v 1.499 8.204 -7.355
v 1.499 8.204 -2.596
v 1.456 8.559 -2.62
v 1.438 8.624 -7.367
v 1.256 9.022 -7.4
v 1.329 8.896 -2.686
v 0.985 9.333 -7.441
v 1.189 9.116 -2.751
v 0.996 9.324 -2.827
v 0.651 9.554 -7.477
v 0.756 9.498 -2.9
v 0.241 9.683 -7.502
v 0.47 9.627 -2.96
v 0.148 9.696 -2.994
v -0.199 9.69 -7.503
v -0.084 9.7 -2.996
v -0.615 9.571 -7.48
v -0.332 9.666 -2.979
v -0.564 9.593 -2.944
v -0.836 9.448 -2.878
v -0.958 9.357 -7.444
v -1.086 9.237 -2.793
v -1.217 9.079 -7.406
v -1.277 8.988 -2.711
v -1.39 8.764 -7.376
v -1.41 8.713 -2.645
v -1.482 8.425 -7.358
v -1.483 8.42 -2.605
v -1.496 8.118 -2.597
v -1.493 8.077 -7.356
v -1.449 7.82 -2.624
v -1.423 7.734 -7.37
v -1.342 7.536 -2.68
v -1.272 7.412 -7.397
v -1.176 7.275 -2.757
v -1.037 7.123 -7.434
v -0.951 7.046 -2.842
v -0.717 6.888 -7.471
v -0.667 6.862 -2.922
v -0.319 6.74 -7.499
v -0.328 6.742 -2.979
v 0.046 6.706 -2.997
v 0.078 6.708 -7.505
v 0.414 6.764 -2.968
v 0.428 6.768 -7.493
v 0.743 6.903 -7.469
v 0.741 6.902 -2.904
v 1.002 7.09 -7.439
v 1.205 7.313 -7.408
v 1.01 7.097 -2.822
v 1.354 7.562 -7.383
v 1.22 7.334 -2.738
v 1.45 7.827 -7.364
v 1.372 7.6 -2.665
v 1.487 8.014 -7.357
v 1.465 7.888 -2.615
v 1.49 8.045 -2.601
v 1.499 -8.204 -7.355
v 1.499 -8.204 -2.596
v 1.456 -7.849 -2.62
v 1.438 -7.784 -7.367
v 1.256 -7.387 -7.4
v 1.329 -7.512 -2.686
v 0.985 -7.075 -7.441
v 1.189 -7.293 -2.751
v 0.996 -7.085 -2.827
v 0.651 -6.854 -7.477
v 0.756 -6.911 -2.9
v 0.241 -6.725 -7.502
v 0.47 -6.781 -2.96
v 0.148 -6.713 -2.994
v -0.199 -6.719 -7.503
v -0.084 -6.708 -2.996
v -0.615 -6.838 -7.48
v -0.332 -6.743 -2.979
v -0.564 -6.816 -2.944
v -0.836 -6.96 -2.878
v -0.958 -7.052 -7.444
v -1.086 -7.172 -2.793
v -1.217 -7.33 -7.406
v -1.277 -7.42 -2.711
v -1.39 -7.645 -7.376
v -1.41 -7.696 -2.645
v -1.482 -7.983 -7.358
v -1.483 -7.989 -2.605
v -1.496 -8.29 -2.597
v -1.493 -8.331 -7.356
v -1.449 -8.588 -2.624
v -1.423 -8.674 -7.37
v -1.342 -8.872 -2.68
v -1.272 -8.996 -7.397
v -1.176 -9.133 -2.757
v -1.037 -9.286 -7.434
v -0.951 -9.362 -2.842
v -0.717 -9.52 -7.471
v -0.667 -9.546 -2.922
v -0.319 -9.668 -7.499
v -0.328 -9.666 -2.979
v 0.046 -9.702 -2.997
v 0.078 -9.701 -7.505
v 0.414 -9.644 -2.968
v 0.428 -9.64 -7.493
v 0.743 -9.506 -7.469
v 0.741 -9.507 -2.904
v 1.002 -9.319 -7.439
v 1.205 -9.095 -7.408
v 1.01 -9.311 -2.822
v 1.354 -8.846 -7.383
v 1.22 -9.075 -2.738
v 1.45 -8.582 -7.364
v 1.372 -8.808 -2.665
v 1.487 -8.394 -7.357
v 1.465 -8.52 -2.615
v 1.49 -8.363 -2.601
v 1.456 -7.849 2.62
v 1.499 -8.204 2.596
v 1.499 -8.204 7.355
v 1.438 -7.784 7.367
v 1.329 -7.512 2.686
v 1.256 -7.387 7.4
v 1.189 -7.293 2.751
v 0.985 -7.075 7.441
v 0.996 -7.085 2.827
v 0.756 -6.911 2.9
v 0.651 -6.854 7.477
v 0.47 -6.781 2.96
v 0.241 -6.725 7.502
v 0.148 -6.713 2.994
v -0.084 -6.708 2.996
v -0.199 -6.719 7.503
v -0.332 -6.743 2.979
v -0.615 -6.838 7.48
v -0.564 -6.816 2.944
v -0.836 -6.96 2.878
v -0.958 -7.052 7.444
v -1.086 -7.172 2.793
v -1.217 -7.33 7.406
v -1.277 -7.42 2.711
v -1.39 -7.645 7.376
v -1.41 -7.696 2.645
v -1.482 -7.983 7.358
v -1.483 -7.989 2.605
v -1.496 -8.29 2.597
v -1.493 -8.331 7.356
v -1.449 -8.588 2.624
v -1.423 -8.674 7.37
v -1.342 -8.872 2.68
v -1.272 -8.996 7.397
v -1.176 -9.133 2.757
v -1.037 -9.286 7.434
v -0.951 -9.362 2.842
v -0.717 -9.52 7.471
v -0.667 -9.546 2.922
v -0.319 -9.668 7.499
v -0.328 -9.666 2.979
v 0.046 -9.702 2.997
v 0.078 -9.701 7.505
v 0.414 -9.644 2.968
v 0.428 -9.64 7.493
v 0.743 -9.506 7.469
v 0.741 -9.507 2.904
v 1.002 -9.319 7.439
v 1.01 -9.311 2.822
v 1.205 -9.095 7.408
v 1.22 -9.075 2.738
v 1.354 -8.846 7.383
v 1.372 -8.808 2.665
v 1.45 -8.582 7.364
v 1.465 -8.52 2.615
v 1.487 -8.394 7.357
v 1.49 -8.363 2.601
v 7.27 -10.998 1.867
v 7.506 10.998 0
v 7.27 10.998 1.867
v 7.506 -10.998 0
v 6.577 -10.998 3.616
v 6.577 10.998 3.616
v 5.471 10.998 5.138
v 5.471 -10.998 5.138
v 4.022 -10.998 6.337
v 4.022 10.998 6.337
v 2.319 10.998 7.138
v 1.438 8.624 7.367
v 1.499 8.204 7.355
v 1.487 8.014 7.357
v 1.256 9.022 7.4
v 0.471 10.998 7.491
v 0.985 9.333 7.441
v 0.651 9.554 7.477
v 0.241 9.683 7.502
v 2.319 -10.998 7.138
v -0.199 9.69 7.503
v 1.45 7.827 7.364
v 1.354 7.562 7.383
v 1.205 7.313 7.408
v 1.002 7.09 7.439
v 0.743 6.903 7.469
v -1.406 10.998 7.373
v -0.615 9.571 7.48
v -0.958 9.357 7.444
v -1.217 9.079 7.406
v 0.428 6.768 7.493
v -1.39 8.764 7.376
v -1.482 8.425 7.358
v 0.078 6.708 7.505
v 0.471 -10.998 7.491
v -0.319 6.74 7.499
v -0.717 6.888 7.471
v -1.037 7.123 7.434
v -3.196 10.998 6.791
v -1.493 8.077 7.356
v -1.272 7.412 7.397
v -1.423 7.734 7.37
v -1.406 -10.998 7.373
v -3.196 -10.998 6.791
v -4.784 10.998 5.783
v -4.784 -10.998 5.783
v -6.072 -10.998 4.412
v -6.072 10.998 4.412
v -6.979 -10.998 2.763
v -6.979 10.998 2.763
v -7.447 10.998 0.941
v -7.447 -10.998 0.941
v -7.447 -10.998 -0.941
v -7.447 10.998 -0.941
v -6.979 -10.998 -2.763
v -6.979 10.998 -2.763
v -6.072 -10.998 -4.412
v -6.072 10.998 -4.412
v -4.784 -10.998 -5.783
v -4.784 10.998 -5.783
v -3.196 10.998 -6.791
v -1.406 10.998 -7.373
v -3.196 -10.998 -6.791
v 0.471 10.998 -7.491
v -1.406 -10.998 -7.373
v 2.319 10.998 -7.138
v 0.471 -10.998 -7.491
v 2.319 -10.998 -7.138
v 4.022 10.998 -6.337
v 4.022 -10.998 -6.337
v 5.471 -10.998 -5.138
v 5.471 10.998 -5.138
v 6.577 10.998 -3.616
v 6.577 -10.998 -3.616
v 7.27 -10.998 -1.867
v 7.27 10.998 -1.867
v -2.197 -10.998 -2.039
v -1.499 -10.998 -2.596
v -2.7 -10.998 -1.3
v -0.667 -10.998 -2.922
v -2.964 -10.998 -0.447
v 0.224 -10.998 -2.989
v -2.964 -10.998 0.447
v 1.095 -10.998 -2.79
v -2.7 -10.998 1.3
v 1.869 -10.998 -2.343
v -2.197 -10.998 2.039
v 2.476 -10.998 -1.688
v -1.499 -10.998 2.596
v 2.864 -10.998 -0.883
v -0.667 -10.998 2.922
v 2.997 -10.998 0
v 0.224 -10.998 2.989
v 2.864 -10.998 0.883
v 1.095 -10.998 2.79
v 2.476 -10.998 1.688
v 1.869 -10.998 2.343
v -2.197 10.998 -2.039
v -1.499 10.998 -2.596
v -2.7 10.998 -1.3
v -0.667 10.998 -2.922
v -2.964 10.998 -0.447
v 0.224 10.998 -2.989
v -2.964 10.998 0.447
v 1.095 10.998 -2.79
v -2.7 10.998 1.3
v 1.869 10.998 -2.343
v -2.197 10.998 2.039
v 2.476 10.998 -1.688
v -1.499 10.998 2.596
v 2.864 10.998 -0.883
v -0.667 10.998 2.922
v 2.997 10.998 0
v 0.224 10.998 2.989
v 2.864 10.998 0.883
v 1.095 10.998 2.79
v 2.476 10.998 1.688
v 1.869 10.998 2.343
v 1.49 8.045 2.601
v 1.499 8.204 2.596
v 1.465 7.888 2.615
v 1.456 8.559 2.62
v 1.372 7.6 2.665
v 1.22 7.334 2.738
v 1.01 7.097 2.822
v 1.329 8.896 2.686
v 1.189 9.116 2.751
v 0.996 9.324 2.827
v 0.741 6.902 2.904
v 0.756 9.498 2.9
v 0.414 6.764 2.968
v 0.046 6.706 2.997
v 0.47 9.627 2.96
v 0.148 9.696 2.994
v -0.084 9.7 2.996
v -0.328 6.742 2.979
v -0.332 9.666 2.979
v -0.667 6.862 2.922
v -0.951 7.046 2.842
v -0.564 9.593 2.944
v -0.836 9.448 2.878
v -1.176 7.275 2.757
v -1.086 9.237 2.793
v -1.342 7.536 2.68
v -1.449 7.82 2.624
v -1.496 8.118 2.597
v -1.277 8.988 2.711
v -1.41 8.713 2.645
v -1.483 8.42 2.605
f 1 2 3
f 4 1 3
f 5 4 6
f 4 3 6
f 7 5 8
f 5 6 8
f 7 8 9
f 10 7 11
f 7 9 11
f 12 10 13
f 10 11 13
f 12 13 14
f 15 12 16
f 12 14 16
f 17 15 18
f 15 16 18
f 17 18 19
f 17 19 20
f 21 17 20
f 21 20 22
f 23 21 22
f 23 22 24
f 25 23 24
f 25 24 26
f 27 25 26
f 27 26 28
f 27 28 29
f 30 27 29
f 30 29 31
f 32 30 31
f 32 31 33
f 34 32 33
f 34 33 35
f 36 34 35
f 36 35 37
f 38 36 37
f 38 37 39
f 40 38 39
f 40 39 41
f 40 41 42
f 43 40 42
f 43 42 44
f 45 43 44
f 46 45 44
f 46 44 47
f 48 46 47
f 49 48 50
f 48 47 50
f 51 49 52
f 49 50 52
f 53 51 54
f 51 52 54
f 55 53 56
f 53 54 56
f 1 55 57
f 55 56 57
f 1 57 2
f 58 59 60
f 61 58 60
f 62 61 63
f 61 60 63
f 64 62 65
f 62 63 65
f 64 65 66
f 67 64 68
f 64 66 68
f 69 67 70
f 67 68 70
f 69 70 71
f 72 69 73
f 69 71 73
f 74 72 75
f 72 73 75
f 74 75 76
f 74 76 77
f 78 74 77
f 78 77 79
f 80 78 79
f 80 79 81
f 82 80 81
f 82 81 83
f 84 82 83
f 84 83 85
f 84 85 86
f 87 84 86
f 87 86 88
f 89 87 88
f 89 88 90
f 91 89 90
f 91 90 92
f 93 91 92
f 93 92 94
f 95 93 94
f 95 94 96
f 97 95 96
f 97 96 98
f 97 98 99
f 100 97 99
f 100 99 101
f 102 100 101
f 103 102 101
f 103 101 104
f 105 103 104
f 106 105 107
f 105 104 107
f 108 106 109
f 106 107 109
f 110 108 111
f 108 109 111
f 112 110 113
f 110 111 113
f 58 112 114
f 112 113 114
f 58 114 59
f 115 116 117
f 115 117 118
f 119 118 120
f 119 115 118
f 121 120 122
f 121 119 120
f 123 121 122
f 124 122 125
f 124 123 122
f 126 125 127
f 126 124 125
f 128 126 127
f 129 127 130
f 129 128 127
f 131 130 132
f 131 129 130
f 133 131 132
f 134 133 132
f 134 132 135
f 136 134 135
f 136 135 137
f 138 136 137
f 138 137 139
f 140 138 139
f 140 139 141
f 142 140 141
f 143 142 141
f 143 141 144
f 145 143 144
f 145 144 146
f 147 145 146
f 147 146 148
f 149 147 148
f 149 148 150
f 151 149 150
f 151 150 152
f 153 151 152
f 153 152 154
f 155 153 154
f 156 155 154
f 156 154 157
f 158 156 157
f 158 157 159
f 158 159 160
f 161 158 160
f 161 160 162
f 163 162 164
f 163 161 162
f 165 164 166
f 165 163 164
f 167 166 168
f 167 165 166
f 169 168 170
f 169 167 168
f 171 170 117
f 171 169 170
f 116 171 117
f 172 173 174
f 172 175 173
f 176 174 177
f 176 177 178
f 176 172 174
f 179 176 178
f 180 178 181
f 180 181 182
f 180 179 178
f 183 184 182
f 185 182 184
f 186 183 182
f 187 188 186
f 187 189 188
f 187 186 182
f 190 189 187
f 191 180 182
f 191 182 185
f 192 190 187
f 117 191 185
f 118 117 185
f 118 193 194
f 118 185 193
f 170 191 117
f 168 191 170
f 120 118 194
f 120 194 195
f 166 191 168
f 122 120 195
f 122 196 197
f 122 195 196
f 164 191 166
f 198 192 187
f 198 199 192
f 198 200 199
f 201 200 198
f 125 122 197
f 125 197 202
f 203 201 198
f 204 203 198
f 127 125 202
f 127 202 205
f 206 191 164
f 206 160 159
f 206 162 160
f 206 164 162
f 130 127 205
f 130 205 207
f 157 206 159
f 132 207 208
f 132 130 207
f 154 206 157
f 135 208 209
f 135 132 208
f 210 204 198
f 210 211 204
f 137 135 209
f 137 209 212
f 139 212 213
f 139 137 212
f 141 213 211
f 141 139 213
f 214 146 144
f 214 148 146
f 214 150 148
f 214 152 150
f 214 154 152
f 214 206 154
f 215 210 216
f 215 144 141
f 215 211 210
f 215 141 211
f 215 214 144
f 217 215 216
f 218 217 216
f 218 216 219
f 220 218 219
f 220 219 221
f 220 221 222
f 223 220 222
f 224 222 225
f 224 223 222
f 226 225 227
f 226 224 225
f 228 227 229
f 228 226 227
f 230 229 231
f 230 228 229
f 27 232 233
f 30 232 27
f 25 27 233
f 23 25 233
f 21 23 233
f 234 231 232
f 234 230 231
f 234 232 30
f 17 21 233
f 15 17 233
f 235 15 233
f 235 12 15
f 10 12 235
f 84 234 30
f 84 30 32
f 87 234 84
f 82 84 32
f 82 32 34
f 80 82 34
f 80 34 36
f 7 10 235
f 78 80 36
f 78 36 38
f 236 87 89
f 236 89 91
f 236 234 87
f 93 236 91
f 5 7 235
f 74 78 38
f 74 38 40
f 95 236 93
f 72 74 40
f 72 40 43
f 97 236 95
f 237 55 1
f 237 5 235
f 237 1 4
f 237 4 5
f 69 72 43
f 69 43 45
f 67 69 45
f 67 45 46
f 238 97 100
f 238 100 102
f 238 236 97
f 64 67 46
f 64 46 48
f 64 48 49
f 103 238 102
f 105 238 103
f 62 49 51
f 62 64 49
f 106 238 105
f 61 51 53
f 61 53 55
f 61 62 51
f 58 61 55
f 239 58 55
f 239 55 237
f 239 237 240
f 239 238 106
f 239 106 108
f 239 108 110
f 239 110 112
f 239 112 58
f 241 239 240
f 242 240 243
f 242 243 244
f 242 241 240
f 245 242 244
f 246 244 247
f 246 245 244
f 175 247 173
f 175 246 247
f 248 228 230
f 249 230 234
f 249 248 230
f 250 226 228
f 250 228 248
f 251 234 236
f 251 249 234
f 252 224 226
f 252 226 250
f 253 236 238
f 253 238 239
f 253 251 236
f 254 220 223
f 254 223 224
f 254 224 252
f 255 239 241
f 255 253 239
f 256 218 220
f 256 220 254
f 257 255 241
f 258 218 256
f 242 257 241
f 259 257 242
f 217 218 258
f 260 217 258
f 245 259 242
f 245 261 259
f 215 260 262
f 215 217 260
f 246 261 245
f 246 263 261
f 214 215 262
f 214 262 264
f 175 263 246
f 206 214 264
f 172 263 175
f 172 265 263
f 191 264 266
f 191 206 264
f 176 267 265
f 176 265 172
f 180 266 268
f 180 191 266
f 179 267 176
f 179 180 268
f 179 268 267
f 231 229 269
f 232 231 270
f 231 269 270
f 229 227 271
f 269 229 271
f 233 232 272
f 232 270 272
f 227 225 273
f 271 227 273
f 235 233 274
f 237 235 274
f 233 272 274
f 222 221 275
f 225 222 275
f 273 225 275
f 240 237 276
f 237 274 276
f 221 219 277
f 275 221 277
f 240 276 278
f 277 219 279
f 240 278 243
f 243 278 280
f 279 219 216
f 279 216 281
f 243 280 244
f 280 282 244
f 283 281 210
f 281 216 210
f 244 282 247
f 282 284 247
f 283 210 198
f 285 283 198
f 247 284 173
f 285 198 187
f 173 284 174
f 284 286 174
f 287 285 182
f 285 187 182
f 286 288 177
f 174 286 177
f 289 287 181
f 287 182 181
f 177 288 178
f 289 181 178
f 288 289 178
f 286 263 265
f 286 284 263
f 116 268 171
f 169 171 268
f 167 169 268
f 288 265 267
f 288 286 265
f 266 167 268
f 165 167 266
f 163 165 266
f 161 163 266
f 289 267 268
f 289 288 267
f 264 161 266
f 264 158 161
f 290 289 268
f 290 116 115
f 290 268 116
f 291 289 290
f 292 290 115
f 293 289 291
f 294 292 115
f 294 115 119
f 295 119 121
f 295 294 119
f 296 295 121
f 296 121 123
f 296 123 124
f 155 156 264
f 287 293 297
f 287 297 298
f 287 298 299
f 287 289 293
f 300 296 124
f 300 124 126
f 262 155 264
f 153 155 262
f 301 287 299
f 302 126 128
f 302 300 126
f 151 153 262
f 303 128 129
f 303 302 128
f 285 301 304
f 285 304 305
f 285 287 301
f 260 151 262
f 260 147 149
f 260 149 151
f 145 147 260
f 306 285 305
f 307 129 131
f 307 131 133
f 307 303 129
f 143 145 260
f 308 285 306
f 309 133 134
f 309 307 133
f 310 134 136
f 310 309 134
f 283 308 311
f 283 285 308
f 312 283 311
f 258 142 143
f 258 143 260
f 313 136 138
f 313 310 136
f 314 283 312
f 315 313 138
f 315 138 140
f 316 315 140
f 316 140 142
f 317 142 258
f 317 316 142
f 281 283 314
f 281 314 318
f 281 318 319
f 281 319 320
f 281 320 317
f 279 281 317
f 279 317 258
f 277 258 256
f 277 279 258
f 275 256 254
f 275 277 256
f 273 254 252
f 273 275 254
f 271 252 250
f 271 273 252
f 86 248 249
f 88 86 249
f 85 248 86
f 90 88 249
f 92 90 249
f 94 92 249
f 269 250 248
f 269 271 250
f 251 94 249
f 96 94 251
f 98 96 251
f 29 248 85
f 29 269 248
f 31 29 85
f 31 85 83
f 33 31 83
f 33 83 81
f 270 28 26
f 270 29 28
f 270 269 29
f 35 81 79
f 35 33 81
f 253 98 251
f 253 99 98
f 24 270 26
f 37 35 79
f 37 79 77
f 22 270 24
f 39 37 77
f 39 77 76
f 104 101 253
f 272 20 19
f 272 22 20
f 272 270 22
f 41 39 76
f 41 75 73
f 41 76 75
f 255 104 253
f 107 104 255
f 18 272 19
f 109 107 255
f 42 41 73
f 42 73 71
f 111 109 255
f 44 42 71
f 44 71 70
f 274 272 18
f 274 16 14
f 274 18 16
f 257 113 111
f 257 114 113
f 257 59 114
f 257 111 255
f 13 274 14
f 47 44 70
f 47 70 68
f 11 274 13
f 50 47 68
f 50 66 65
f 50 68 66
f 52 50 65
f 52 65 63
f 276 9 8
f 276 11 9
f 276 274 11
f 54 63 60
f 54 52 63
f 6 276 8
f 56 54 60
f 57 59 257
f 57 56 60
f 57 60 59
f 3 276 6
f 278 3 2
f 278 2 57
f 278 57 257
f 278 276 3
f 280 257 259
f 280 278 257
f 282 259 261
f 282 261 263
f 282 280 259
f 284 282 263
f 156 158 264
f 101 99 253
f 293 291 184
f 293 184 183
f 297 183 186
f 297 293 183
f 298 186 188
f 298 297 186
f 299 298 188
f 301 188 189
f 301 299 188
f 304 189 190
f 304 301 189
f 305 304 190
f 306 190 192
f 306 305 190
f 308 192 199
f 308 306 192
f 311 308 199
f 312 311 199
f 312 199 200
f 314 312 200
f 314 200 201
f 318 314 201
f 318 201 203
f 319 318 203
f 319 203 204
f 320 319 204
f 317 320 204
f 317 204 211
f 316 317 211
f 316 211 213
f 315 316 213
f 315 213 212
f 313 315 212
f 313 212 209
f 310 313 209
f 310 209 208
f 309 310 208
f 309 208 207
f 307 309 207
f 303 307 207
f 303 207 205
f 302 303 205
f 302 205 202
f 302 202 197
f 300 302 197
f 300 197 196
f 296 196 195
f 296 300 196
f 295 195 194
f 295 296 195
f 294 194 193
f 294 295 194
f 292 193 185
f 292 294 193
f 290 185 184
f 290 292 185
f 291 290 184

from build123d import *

# Parameters (mm, degrees)
F0_R          = 7.5057
F0_R_2        = 2.9972
F1_DEPTH      = 10.9982
F2_R          = 1.4986
F3_DEPTH      = 7.5067
F3_DEPTH_BACK = 7.5067


with BuildPart() as f1:
    # F0 (on Front) → F1 (new body, symmetric)
    with BuildSketch(Plane.XZ):
        Circle(F0_R)
        Circle(F0_R_2, mode=Mode.SUBTRACT)
    extrude(amount=F1_DEPTH, both=True)

    # F2 (on Top) → F3 (cut, two sides)
    with BuildSketch(Plane.XY) as f3_sk:
        with Locations((0, 8.2042)):
            Circle(F2_R)
        with Locations((0, -8.2042)):
            Circle(F2_R)
    extrude(amount=F3_DEPTH, mode=Mode.SUBTRACT)
    extrude(f3_sk.sketch, amount=-F3_DEPTH_BACK, mode=Mode.SUBTRACT)


solid = f1.part
